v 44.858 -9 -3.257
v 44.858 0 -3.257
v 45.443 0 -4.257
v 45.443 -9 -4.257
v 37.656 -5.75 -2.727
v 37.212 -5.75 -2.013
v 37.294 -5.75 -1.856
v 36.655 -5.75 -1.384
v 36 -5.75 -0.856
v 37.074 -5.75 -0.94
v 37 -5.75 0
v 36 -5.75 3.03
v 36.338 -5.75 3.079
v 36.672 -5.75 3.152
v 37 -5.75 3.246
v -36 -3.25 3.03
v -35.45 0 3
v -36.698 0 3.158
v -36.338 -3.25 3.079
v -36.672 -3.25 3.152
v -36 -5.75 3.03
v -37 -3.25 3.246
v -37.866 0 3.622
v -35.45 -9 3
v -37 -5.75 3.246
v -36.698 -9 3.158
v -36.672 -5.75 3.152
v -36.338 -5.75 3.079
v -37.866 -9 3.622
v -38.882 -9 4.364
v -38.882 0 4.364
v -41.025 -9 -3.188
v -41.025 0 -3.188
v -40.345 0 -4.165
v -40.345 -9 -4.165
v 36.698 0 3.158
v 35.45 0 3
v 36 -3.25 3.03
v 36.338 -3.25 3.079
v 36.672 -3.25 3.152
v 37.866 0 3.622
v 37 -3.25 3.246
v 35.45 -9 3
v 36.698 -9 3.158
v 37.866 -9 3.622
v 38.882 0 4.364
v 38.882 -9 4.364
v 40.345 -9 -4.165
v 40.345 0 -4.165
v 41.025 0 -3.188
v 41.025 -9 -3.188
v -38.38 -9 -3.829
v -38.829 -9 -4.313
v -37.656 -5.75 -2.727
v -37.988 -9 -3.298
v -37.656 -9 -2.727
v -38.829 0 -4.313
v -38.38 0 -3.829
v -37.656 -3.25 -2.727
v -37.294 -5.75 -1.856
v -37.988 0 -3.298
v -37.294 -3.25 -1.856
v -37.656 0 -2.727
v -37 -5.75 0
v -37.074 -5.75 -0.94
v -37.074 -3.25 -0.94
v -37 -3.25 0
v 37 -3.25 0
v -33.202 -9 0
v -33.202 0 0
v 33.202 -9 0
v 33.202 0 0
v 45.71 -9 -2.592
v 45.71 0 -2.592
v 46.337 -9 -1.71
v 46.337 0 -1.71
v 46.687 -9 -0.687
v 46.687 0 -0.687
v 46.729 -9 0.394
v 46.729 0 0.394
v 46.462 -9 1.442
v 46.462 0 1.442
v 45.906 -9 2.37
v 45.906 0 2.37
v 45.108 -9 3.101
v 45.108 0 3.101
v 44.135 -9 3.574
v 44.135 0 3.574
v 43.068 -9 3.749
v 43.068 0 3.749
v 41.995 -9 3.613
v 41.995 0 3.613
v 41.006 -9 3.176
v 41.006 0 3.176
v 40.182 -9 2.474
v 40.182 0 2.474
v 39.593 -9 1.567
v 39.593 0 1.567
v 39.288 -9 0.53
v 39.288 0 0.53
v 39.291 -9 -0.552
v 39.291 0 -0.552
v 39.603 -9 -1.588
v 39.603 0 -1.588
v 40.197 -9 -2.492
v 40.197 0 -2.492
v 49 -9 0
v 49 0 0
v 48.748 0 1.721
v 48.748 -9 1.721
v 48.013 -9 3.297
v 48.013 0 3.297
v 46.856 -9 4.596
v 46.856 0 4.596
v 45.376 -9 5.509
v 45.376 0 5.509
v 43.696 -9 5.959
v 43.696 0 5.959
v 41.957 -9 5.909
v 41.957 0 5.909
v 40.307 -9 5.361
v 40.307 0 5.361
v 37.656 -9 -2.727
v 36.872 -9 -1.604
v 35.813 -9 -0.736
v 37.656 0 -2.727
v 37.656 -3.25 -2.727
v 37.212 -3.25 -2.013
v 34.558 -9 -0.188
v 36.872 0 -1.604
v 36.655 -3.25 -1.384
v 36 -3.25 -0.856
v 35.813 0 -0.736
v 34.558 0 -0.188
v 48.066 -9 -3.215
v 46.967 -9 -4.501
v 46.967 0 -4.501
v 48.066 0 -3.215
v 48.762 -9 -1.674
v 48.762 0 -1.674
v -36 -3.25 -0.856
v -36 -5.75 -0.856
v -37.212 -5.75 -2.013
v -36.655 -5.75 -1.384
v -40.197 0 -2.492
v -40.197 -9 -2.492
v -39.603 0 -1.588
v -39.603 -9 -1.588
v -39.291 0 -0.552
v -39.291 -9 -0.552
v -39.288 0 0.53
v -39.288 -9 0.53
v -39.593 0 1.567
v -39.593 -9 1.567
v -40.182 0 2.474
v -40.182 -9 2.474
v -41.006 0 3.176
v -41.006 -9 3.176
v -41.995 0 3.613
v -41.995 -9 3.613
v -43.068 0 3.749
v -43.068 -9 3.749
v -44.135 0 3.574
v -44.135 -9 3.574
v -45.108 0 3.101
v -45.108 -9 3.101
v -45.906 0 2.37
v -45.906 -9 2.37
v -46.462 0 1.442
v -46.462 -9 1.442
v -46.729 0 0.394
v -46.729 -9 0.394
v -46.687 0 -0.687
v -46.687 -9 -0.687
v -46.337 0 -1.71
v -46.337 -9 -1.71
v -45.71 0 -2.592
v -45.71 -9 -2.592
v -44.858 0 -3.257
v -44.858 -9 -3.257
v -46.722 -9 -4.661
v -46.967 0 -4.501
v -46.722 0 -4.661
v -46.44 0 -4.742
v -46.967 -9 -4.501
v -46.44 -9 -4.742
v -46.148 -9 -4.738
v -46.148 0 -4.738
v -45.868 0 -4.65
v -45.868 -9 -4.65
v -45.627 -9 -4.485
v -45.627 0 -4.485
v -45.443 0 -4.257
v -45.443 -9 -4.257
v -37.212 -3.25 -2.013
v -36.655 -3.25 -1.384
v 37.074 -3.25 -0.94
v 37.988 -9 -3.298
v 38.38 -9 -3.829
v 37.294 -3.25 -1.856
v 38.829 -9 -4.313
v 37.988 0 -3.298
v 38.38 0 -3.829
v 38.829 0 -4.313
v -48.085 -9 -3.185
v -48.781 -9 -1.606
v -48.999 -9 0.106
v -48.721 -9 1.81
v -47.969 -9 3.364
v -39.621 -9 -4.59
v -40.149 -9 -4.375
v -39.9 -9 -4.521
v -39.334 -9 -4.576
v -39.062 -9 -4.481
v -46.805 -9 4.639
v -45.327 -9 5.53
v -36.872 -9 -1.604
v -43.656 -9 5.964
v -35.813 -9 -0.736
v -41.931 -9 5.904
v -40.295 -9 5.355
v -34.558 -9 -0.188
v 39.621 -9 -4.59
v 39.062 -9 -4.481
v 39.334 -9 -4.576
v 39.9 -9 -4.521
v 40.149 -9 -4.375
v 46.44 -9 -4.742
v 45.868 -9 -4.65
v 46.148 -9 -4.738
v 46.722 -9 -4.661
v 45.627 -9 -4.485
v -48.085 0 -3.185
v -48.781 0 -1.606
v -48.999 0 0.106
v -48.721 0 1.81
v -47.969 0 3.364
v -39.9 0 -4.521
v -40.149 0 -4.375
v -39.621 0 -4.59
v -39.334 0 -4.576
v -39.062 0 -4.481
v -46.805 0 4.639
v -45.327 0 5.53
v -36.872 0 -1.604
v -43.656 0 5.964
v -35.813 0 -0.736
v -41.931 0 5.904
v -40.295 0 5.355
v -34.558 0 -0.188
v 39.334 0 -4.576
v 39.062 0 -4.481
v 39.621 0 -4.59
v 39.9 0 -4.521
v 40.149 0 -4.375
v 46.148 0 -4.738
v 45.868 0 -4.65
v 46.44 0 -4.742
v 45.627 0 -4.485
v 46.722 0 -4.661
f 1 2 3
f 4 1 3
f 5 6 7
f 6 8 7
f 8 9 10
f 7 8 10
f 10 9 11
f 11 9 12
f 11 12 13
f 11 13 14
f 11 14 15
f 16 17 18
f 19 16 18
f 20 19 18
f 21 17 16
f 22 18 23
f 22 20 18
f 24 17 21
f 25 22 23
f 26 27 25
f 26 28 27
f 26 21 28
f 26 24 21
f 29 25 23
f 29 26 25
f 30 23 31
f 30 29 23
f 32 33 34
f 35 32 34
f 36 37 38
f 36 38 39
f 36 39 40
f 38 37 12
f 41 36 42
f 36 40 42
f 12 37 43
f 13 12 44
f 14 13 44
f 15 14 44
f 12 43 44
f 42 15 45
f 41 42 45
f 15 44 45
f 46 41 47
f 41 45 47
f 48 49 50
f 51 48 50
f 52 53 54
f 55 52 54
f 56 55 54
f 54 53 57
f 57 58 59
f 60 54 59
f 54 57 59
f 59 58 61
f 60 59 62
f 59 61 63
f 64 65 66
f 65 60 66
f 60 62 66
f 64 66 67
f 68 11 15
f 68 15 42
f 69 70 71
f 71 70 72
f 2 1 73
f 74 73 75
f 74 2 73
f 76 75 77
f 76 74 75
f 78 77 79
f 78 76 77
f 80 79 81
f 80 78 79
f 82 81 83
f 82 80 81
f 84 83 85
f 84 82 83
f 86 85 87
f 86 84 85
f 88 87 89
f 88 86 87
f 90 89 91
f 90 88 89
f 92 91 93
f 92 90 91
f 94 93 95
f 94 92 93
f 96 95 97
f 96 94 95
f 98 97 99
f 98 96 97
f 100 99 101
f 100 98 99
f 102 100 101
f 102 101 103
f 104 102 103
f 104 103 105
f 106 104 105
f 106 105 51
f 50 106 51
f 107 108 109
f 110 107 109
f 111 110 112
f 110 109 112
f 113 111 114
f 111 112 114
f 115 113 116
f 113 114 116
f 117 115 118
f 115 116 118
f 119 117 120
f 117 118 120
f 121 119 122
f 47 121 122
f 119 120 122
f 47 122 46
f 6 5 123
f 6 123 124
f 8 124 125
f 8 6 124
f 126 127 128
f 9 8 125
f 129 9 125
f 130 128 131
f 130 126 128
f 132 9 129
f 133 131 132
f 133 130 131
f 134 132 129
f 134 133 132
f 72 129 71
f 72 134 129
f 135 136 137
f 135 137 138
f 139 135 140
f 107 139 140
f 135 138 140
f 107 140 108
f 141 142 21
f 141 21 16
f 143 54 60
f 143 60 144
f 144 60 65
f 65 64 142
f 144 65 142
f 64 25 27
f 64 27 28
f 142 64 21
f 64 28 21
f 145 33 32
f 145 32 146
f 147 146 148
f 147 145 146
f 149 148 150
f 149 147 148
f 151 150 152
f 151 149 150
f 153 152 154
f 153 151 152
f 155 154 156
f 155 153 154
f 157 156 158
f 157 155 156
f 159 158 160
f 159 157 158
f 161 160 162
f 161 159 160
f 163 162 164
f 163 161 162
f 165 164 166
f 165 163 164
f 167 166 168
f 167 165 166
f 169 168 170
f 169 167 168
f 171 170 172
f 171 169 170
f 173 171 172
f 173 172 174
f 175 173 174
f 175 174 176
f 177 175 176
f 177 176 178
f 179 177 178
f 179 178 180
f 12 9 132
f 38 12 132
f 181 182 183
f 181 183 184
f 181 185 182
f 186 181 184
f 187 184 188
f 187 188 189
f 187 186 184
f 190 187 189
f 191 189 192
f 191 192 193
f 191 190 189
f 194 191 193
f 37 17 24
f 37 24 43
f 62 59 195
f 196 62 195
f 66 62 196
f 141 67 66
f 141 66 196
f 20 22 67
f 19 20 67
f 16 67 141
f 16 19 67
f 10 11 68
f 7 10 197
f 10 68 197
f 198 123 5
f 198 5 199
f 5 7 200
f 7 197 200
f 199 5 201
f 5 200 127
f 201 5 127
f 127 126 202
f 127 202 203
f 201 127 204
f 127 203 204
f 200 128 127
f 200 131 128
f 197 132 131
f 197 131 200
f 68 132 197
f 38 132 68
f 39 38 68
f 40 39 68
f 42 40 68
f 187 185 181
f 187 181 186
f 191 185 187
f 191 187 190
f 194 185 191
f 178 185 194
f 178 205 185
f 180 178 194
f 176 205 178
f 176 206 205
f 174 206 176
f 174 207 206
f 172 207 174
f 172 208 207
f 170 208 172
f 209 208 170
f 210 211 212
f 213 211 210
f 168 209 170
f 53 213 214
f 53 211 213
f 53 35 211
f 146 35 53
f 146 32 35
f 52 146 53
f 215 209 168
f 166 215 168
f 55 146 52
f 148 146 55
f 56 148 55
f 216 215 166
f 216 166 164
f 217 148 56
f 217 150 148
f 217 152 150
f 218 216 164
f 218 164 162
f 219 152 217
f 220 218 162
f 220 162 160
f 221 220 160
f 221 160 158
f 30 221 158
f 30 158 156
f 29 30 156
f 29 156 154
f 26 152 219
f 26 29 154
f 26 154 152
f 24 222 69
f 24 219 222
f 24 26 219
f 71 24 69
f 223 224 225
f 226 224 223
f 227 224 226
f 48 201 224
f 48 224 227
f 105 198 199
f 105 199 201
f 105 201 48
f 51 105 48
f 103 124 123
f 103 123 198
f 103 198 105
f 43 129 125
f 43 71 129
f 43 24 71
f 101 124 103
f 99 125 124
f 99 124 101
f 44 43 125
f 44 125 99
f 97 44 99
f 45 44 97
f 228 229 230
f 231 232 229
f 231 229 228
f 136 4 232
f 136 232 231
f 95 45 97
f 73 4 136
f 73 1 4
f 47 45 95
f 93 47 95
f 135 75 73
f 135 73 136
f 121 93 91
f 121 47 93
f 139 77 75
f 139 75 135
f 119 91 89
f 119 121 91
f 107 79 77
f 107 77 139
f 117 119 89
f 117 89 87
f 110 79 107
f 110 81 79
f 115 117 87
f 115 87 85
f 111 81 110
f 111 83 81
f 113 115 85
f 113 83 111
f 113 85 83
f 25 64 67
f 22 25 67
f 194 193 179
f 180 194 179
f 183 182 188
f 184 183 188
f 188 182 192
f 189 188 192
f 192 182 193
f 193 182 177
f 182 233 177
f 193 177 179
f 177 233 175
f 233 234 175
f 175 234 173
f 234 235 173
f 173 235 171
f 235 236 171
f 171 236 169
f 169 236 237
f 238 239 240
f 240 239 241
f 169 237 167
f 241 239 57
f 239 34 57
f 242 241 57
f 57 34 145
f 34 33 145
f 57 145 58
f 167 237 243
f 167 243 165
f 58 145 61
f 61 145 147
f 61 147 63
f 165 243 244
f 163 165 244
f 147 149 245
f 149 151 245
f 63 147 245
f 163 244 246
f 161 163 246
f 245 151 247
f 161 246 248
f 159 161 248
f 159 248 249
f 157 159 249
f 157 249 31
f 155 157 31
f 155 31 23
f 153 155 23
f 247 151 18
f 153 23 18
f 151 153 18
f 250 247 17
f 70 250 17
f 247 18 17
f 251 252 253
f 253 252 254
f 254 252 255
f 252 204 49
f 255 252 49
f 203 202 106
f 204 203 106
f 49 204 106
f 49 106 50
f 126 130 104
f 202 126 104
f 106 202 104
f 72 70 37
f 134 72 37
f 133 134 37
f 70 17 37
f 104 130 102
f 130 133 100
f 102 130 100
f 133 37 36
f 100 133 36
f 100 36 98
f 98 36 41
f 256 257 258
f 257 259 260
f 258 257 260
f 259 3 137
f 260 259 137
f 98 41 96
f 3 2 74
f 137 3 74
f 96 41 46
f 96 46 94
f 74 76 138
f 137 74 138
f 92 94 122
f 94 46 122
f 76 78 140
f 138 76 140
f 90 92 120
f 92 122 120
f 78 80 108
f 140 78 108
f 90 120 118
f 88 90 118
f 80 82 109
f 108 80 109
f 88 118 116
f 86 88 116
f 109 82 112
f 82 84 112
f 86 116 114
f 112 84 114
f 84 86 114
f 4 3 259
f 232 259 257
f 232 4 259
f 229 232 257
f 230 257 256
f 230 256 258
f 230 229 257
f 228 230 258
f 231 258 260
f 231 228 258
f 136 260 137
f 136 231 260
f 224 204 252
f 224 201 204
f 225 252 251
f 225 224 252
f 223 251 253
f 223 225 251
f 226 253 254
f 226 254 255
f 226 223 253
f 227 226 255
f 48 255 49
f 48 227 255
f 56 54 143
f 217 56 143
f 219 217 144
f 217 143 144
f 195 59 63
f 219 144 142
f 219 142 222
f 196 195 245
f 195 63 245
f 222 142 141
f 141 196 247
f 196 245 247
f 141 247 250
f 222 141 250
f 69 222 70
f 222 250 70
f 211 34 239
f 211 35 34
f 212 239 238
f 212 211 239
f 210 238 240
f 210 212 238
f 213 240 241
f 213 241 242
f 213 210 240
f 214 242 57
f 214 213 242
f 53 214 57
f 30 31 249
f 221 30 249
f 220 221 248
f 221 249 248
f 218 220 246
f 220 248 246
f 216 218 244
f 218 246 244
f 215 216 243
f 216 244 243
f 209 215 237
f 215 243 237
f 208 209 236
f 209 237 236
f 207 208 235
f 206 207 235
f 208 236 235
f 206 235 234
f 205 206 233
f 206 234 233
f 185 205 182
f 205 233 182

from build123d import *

# Parameters (mm, degrees)
F1_DEPTH      = 9
F2_R          = 1
F2_2_R        = 1
F3_W          = 86
F3_H          = 9
F4_DEPTH      = 3
F7_R          = 2
F8_DEPTH      = 25
F9_W          = 1
F9_H          = 2.5
F10_DEPTH     = 25
F11_R         = 3.75
F12_DEPTH     = 25
F13_T1_DEPTH  = 3.25
F13_T3_DEPTH  = 3.25
F13_T8_DEPTH  = 14.8842050314
F13_T13_DEPTH = 9
F13_T18_DEPTH = 9
F13_T23_DEPTH = 14.8842050314
F13_T28_DEPTH = 14.8842050314
F13_T33_DEPTH = 9
F13_T38_DEPTH = 9
F13_T43_DEPTH = 14.8842050314
F13_T48_DEPTH = 22.2397948557
F13_T54_DEPTH = 12.7448974278
F13_T60_DEPTH = 22.2397948557
F13_T66_DEPTH = 12.7448974278
F13_T72_DEPTH = 22.2397948557
F13_T78_DEPTH = 12.7448974278
F13_T84_DEPTH = 22.2397948557
F13_T90_DEPTH = 12.7448974278


# Not quite as in the source:
# - a fillet or chamfer that OpenCascade refuses, or shapes differently, is made with other operations: its cross-section is extruded or revolved along the edge and cut away or added
# - a feature names something its author has since deleted; it is built from what else it names


with BuildPart() as f1:
    # F0 (on Front) → F1 (new body)
    with BuildSketch(Plane.XZ):
        with BuildLine():
            ThreePointArc((-43.9727372119, -1.7475074582), (-44.0135397319, 1.7241627568), (-41, 0))
            Line((-41, 0), (-37, 0))
            ThreePointArc((-37, 0), (-46.0022354873, 5.1948611222), (-45.9955273596, -5.1987321375))
            Line((-45.9955273596, -5.1987321375), (-43.9727372119, -1.7475074582))
        make_face()
        with BuildLine():
            Line((-37, 0), (-41, 0))
            ThreePointArc((-41, 0), (-41.2758372432, -1.0135397319), (-42.0272627881, -1.7475074582))
            Line((-42.0272627881, -1.7475074582), (-39.7389427056, -5.0364179059))
            ThreePointArc((-39.7389427056, -5.0364179059), (-37.7290255281, -2.8665010233), (-37, 0))
        make_face()
    extrude(amount=F1_DEPTH)

    # F2
    f2_edges = [f1.edges().sort_by_distance(p)[0] for p in [
        (-42.027263, -4.5, -1.747507),
        (-43.972737, -4.5, -1.747507),
        (-39.738943, -4.5, -5.036418),
        (-45.995527, -4.5, -5.198732),
    ]]
    fillet(f2_edges, radius=F2_R)



with BuildPart() as f1b:
    # F0 (on Front) → F1, piece 2 (new body)
    with BuildSketch(Plane.XZ):
        with BuildLine():
            Line((41, 0), (37, 0))
            ThreePointArc((37, 0), (37.7290255281, -2.8665010233), (39.7389427056, -5.0364179059))
            Line((39.7389427056, -5.0364179059), (42.0272627881, -1.7475074582))
            ThreePointArc((42.0272627881, -1.7475074582), (41.2758372432, -1.0135397319), (41, 0))
        make_face()
        with BuildLine():
            ThreePointArc((49, 0), (43, 6), (37, 0))
            Line((37, 0), (41, 0))
            ThreePointArc((41, 0), (43, 2), (45, 0))
            ThreePointArc((45, 0), (44.7241627568, -1.0135397319), (43.9727372119, -1.7475074582))
            Line((43.9727372119, -1.7475074582), (45.9955273596, -5.1987321375))
            ThreePointArc((45.9955273596, -5.1987321375), (48.1948611222, -3.0022354873), (49, 0))
        make_face()
    extrude(amount=F1_DEPTH)

    # F2#2
    f2_2_edges = [f1b.edges().sort_by_distance(p)[0] for p in [
        (42.027263, -4.5, -1.747507),
        (43.972737, -4.5, -1.747507),
        (39.738943, -4.5, -5.036418),
        (45.995527, -4.5, -5.198732),
    ]]
    fillet(f2_2_edges, radius=F2_2_R)


with BuildPart() as f1_1:
    add(f1.part)

    add(f1b.part)  # F4 merges F1b
    # F3 (on Top) → F4 (join)
    with BuildSketch(Plane.XY):
        with Locations((0.0100198983, -4.5)):
            Rectangle(F3_W, F3_H)
    extrude(amount=F4_DEPTH)

    # F5: union 

    # F6: union 

    # F7 (on Front) → F8 (cut)
    with BuildSketch(Plane.XZ):
        with Locations((-43.0078394711, 0)):
            Circle(F7_R)
        with Locations((42.9660789669, 0)):
            Circle(F7_R)
    extrude(amount=F8_DEPTH, mode=Mode.SUBTRACT)

    # F9 (on face) → F10 (cut)
    with BuildSketch(Plane(origin=(0, 0, 0), x_dir=(1, 0, 0), z_dir=(0, 0, -1))):
        with Locations((36.5, 4.5)):
            Rectangle(F9_W, F9_H)
        with Locations((-36.5, 4.5)):
            Rectangle(F9_W, F9_H)
    extrude(amount=-F10_DEPTH, mode=Mode.SUBTRACT)

    # F11 (on Front) → F12 (cut)
    with BuildSketch(Plane.XZ):
        with Locations((-43, 0)):
            Circle(F11_R)
        with Locations((43, 0)):
            Circle(F11_R)
    extrude(amount=F12_DEPTH, mode=Mode.SUBTRACT)

    # F13: fillet of radius 5 on 6 edges, made by hand

    # F13_s2 → F13_t1 (join)
    with BuildSketch(Plane.XZ.offset(5.75)):
        with BuildLine():
            ThreePointArc((-37.655658743, -2.7272727273), (-35.8132058682, -0.7359856729), (-33.2020410289, 0))
            Line((-33.2020410289, 0), (-37, 0))
            ThreePointArc((-37, 0), (-37.1662170274, -1.4024892973), (-37.655658743, -2.7272727273))
        make_face()
        with BuildLine():
            ThreePointArc((37.655658743, -2.7272727273), (35.8132058682, -0.7359856729), (33.2020410289, 0))
            Line((33.2020410289, 0), (37, 0))
            ThreePointArc((37, 0), (37.1662170274, -1.4024892973), (37.655658743, -2.7272727273))
        make_face()
    extrude(amount=F13_T1_DEPTH)

    # F13_s4 → F13_t3 (join)
    with BuildSketch(Plane.XZ):
        with BuildLine():
            ThreePointArc((37.655658743, -2.7272727273), (35.8132058682, -0.7359856729), (33.2020410289, 0))
            Line((33.2020410289, 0), (37, 0))
            ThreePointArc((37, 0), (37.1662170274, -1.4024892973), (37.655658743, -2.7272727273))
        make_face()
        with BuildLine():
            ThreePointArc((-37.655658743, -2.7272727273), (-35.8132058682, -0.7359856729), (-33.2020410289, 0))
            Line((-33.2020410289, 0), (-37, 0))
            ThreePointArc((-37, 0), (-37.1662170274, -1.4024892973), (-37.655658743, -2.7272727273))
        make_face()
    extrude(amount=F13_T3_DEPTH)


with BuildPart() as f13_tool6:
    # F13_s7 → F13_t8 (new body)
    with BuildSketch(Plane.XZ.offset(9)):
        with BuildLine():
            ThreePointArc((35.4501655647, 3), (37.2965379294, 3.3533981136), (38.8819084899, 4.3636363636))
            ThreePointArc((38.8819084899, 4.3636363636), (38.2932324209, 3.7210669111), (37.8038475773, 3))
            Line((37.8038475773, 3), (35.4501655647, 3))
        make_face()
    extrude(amount=-F13_T8_DEPTH)

    split(bisect_by=Plane.XZ.offset(5.75), keep=Keep.TOP)


with BuildPart() as f1_2:
    add(f1_1.part)

    # F13_t5: union F13_tool6
    add(f13_tool6.part)


with BuildPart() as f13_tool11:
    # F13_s12 → F13_t13 (new body)
    with BuildSketch(Plane.XZ.offset(9)):
        with BuildLine():
            ThreePointArc((35.4501655647, 3), (37.2965379294, 3.3533981136), (38.8819084899, 4.3636363636))
            ThreePointArc((38.8819084899, 4.3636363636), (38.2932324209, 3.7210669111), (37.8038475773, 3))
            Line((37.8038475773, 3), (35.4501655647, 3))
        make_face()
    extrude(amount=-F13_T13_DEPTH)

    split(bisect_by=Plane.YZ.offset(36), keep=Keep.BOTTOM)


with BuildPart() as f1_3:
    add(f1_2.part)

    # F13_t10: union F13_tool11
    add(f13_tool11.part)


with BuildPart() as f13_tool16:
    # F13_s17 → F13_t18 (new body)
    with BuildSketch(Plane.XZ.offset(9)):
        with BuildLine():
            ThreePointArc((35.4501655647, 3), (37.2965379294, 3.3533981136), (38.8819084899, 4.3636363636))
            ThreePointArc((38.8819084899, 4.3636363636), (38.2932324209, 3.7210669111), (37.8038475773, 3))
            Line((37.8038475773, 3), (35.4501655647, 3))
        make_face()
    extrude(amount=-F13_T18_DEPTH)

    split(bisect_by=Plane.YZ.offset(37), keep=Keep.TOP)


with BuildPart() as f1_4:
    add(f1_3.part)

    # F13_t15: union F13_tool16
    add(f13_tool16.part)


with BuildPart() as f13_tool21:
    # F13_s22 → F13_t23 (new body)
    with BuildSketch(Plane.XZ.offset(14.8842050314)):
        with BuildLine():
            ThreePointArc((35.4501655647, 3), (37.2965379294, 3.3533981136), (38.8819084899, 4.3636363636))
            ThreePointArc((38.8819084899, 4.3636363636), (38.2932324209, 3.7210669111), (37.8038475773, 3))
            Line((37.8038475773, 3), (35.4501655647, 3))
        make_face()
    extrude(amount=-F13_T23_DEPTH)

    split(bisect_by=Plane.XZ.offset(3.25), keep=Keep.BOTTOM)


with BuildPart() as f1_5:
    add(f1_4.part)

    # F13_t20: union F13_tool21
    add(f13_tool21.part)


with BuildPart() as f13_tool26:
    # F13_s27 → F13_t28 (new body)
    with BuildSketch(Plane.XZ.offset(9)):
        with BuildLine():
            ThreePointArc((-35.4501655647, 3), (-37.2965379294, 3.3533981136), (-38.8819084899, 4.3636363636))
            ThreePointArc((-38.8819084899, 4.3636363636), (-38.2932324209, 3.7210669111), (-37.8038475773, 3))
            Line((-37.8038475773, 3), (-35.4501655647, 3))
        make_face()
    extrude(amount=-F13_T28_DEPTH)

    split(bisect_by=Plane.XZ.offset(5.75), keep=Keep.TOP)


with BuildPart() as f1_6:
    add(f1_5.part)

    # F13_t25: union F13_tool26
    add(f13_tool26.part)


with BuildPart() as f13_tool31:
    # F13_s32 → F13_t33 (new body)
    with BuildSketch(Plane.XZ.offset(9)):
        with BuildLine():
            ThreePointArc((-35.4501655647, 3), (-37.2965379294, 3.3533981136), (-38.8819084899, 4.3636363636))
            ThreePointArc((-38.8819084899, 4.3636363636), (-38.2932324209, 3.7210669111), (-37.8038475773, 3))
            Line((-37.8038475773, 3), (-35.4501655647, 3))
        make_face()
    extrude(amount=-F13_T33_DEPTH)

    split(bisect_by=Plane.YZ.offset(-36), keep=Keep.TOP)


with BuildPart() as f1_7:
    add(f1_6.part)

    # F13_t30: union F13_tool31
    add(f13_tool31.part)


with BuildPart() as f13_tool36:
    # F13_s37 → F13_t38 (new body)
    with BuildSketch(Plane.XZ.offset(9)):
        with BuildLine():
            ThreePointArc((-35.4501655647, 3), (-37.2965379294, 3.3533981136), (-38.8819084899, 4.3636363636))
            ThreePointArc((-38.8819084899, 4.3636363636), (-38.2932324209, 3.7210669111), (-37.8038475773, 3))
            Line((-37.8038475773, 3), (-35.4501655647, 3))
        make_face()
    extrude(amount=-F13_T38_DEPTH)

    split(bisect_by=Plane.YZ.offset(-37), keep=Keep.BOTTOM)


with BuildPart() as f1_8:
    add(f1_7.part)

    # F13_t35: union F13_tool36
    add(f13_tool36.part)


with BuildPart() as f13_tool41:
    # F13_s42 → F13_t43 (new body)
    with BuildSketch(Plane.XZ.offset(14.8842050314)):
        with BuildLine():
            ThreePointArc((-35.4501655647, 3), (-37.2965379294, 3.3533981136), (-38.8819084899, 4.3636363636))
            ThreePointArc((-38.8819084899, 4.3636363636), (-38.2932324209, 3.7210669111), (-37.8038475773, 3))
            Line((-37.8038475773, 3), (-35.4501655647, 3))
        make_face()
    extrude(amount=-F13_T43_DEPTH)

    split(bisect_by=Plane.XZ.offset(3.25), keep=Keep.BOTTOM)


with BuildPart() as f1_9:
    add(f1_8.part)

    # F13_t40: union F13_tool41
    add(f13_tool41.part)


with BuildPart() as f13_tool46:
    # F13_s47 → F13_t48 (new body)
    with BuildSketch(Plane.XZ.offset(18.4948974278)):
        with BuildLine():
            ThreePointArc((-37.655658743, -2.7272727273), (-35.8132058682, -0.7359856729), (-33.2020410289, 0))
            Line((-33.2020410289, 0), (-37, 0))
            ThreePointArc((-37, 0), (-37.1662170274, -1.4024892973), (-37.655658743, -2.7272727273))
        make_face()
    extrude(amount=-F13_T48_DEPTH)

    split(bisect_by=Plane.XZ.offset(3.25), keep=Keep.BOTTOM)

    split(bisect_by=Plane.XZ, keep=Keep.TOP)


with BuildPart() as f1_10:
    add(f1_9.part)

    # F13_t45: union F13_tool46
    add(f13_tool46.part)


with BuildPart() as f13_tool52:
    # F13_s53 → F13_t54 (new body)
    with BuildSketch(Plane.XZ.offset(9)):
        with BuildLine():
            ThreePointArc((-37.655658743, -2.7272727273), (-35.8132058682, -0.7359856729), (-33.2020410289, 0))
            Line((-33.2020410289, 0), (-37, 0))
            ThreePointArc((-37, 0), (-37.1662170274, -1.4024892973), (-37.655658743, -2.7272727273))
        make_face()
    extrude(amount=-F13_T54_DEPTH)

    split(bisect_by=Plane.YZ.offset(-36), keep=Keep.TOP)

    split(bisect_by=Plane.XZ, keep=Keep.TOP)


with BuildPart() as f1_11:
    add(f1_10.part)

    # F13_t51: union F13_tool52
    add(f13_tool52.part)


with BuildPart() as f13_tool58:
    # F13_s59 → F13_t60 (new body)
    with BuildSketch(Plane.XZ.offset(18.4948974278)):
        with BuildLine():
            ThreePointArc((37.655658743, -2.7272727273), (35.8132058682, -0.7359856729), (33.2020410289, 0))
            Line((33.2020410289, 0), (37, 0))
            ThreePointArc((37, 0), (37.1662170274, -1.4024892973), (37.655658743, -2.7272727273))
        make_face()
    extrude(amount=-F13_T60_DEPTH)

    split(bisect_by=Plane.XZ.offset(3.25), keep=Keep.BOTTOM)

    split(bisect_by=Plane.XZ, keep=Keep.TOP)


with BuildPart() as f1_12:
    add(f1_11.part)

    # F13_t57: union F13_tool58
    add(f13_tool58.part)


with BuildPart() as f13_tool64:
    # F13_s65 → F13_t66 (new body)
    with BuildSketch(Plane.XZ.offset(9)):
        with BuildLine():
            ThreePointArc((37.655658743, -2.7272727273), (35.8132058682, -0.7359856729), (33.2020410289, 0))
            Line((33.2020410289, 0), (37, 0))
            ThreePointArc((37, 0), (37.1662170274, -1.4024892973), (37.655658743, -2.7272727273))
        make_face()
    extrude(amount=-F13_T66_DEPTH)

    split(bisect_by=Plane.YZ.offset(36), keep=Keep.BOTTOM)

    split(bisect_by=Plane.XZ, keep=Keep.TOP)


with BuildPart() as f1_13:
    add(f1_12.part)

    # F13_t63: union F13_tool64
    add(f13_tool64.part)


with BuildPart() as f13_tool70:
    # F13_s71 → F13_t72 (new body)
    with BuildSketch(Plane.XZ.offset(12.7448974278)):
        with BuildLine():
            ThreePointArc((37.655658743, -2.7272727273), (35.8132058682, -0.7359856729), (33.2020410289, 0))
            Line((33.2020410289, 0), (37, 0))
            ThreePointArc((37, 0), (37.1662170274, -1.4024892973), (37.655658743, -2.7272727273))
        make_face()
    extrude(amount=-F13_T72_DEPTH)

    split(bisect_by=Plane.XZ.offset(5.75), keep=Keep.TOP)

    split(bisect_by=Plane.XZ.offset(9), keep=Keep.BOTTOM)


with BuildPart() as f1_14:
    add(f1_13.part)

    # F13_t69: union F13_tool70
    add(f13_tool70.part)


with BuildPart() as f13_tool76:
    # F13_s77 → F13_t78 (new body)
    with BuildSketch(Plane.XZ.offset(12.7448974278)):
        with BuildLine():
            ThreePointArc((37.655658743, -2.7272727273), (35.8132058682, -0.7359856729), (33.2020410289, 0))
            Line((33.2020410289, 0), (37, 0))
            ThreePointArc((37, 0), (37.1662170274, -1.4024892973), (37.655658743, -2.7272727273))
        make_face()
    extrude(amount=-F13_T78_DEPTH)

    split(bisect_by=Plane.YZ.offset(36), keep=Keep.BOTTOM)

    split(bisect_by=Plane.XZ.offset(9), keep=Keep.BOTTOM)


with BuildPart() as f1_15:
    add(f1_14.part)

    # F13_t75: union F13_tool76
    add(f13_tool76.part)


with BuildPart() as f13_tool82:
    # F13_s83 → F13_t84 (new body)
    with BuildSketch(Plane.XZ.offset(12.7448974278)):
        with BuildLine():
            ThreePointArc((-37.655658743, -2.7272727273), (-35.8132058682, -0.7359856729), (-33.2020410289, 0))
            Line((-33.2020410289, 0), (-37, 0))
            ThreePointArc((-37, 0), (-37.1662170274, -1.4024892973), (-37.655658743, -2.7272727273))
        make_face()
    extrude(amount=-F13_T84_DEPTH)

    split(bisect_by=Plane.XZ.offset(5.75), keep=Keep.TOP)

    split(bisect_by=Plane.XZ.offset(9), keep=Keep.BOTTOM)


with BuildPart() as f1_16:
    add(f1_15.part)

    # F13_t81: union F13_tool82
    add(f13_tool82.part)


with BuildPart() as f13_tool88:
    # F13_s89 → F13_t90 (new body)
    with BuildSketch(Plane.XZ.offset(12.7448974278)):
        with BuildLine():
            ThreePointArc((-37.655658743, -2.7272727273), (-35.8132058682, -0.7359856729), (-33.2020410289, 0))
            Line((-33.2020410289, 0), (-37, 0))
            ThreePointArc((-37, 0), (-37.1662170274, -1.4024892973), (-37.655658743, -2.7272727273))
        make_face()
    extrude(amount=-F13_T90_DEPTH)

    split(bisect_by=Plane.YZ.offset(-36), keep=Keep.TOP)

    split(bisect_by=Plane.XZ.offset(9), keep=Keep.BOTTOM)


with BuildPart() as f1_17:
    add(f1_16.part)

    # F13_t87: union F13_tool88
    add(f13_tool88.part)


solid = f1_17.part
